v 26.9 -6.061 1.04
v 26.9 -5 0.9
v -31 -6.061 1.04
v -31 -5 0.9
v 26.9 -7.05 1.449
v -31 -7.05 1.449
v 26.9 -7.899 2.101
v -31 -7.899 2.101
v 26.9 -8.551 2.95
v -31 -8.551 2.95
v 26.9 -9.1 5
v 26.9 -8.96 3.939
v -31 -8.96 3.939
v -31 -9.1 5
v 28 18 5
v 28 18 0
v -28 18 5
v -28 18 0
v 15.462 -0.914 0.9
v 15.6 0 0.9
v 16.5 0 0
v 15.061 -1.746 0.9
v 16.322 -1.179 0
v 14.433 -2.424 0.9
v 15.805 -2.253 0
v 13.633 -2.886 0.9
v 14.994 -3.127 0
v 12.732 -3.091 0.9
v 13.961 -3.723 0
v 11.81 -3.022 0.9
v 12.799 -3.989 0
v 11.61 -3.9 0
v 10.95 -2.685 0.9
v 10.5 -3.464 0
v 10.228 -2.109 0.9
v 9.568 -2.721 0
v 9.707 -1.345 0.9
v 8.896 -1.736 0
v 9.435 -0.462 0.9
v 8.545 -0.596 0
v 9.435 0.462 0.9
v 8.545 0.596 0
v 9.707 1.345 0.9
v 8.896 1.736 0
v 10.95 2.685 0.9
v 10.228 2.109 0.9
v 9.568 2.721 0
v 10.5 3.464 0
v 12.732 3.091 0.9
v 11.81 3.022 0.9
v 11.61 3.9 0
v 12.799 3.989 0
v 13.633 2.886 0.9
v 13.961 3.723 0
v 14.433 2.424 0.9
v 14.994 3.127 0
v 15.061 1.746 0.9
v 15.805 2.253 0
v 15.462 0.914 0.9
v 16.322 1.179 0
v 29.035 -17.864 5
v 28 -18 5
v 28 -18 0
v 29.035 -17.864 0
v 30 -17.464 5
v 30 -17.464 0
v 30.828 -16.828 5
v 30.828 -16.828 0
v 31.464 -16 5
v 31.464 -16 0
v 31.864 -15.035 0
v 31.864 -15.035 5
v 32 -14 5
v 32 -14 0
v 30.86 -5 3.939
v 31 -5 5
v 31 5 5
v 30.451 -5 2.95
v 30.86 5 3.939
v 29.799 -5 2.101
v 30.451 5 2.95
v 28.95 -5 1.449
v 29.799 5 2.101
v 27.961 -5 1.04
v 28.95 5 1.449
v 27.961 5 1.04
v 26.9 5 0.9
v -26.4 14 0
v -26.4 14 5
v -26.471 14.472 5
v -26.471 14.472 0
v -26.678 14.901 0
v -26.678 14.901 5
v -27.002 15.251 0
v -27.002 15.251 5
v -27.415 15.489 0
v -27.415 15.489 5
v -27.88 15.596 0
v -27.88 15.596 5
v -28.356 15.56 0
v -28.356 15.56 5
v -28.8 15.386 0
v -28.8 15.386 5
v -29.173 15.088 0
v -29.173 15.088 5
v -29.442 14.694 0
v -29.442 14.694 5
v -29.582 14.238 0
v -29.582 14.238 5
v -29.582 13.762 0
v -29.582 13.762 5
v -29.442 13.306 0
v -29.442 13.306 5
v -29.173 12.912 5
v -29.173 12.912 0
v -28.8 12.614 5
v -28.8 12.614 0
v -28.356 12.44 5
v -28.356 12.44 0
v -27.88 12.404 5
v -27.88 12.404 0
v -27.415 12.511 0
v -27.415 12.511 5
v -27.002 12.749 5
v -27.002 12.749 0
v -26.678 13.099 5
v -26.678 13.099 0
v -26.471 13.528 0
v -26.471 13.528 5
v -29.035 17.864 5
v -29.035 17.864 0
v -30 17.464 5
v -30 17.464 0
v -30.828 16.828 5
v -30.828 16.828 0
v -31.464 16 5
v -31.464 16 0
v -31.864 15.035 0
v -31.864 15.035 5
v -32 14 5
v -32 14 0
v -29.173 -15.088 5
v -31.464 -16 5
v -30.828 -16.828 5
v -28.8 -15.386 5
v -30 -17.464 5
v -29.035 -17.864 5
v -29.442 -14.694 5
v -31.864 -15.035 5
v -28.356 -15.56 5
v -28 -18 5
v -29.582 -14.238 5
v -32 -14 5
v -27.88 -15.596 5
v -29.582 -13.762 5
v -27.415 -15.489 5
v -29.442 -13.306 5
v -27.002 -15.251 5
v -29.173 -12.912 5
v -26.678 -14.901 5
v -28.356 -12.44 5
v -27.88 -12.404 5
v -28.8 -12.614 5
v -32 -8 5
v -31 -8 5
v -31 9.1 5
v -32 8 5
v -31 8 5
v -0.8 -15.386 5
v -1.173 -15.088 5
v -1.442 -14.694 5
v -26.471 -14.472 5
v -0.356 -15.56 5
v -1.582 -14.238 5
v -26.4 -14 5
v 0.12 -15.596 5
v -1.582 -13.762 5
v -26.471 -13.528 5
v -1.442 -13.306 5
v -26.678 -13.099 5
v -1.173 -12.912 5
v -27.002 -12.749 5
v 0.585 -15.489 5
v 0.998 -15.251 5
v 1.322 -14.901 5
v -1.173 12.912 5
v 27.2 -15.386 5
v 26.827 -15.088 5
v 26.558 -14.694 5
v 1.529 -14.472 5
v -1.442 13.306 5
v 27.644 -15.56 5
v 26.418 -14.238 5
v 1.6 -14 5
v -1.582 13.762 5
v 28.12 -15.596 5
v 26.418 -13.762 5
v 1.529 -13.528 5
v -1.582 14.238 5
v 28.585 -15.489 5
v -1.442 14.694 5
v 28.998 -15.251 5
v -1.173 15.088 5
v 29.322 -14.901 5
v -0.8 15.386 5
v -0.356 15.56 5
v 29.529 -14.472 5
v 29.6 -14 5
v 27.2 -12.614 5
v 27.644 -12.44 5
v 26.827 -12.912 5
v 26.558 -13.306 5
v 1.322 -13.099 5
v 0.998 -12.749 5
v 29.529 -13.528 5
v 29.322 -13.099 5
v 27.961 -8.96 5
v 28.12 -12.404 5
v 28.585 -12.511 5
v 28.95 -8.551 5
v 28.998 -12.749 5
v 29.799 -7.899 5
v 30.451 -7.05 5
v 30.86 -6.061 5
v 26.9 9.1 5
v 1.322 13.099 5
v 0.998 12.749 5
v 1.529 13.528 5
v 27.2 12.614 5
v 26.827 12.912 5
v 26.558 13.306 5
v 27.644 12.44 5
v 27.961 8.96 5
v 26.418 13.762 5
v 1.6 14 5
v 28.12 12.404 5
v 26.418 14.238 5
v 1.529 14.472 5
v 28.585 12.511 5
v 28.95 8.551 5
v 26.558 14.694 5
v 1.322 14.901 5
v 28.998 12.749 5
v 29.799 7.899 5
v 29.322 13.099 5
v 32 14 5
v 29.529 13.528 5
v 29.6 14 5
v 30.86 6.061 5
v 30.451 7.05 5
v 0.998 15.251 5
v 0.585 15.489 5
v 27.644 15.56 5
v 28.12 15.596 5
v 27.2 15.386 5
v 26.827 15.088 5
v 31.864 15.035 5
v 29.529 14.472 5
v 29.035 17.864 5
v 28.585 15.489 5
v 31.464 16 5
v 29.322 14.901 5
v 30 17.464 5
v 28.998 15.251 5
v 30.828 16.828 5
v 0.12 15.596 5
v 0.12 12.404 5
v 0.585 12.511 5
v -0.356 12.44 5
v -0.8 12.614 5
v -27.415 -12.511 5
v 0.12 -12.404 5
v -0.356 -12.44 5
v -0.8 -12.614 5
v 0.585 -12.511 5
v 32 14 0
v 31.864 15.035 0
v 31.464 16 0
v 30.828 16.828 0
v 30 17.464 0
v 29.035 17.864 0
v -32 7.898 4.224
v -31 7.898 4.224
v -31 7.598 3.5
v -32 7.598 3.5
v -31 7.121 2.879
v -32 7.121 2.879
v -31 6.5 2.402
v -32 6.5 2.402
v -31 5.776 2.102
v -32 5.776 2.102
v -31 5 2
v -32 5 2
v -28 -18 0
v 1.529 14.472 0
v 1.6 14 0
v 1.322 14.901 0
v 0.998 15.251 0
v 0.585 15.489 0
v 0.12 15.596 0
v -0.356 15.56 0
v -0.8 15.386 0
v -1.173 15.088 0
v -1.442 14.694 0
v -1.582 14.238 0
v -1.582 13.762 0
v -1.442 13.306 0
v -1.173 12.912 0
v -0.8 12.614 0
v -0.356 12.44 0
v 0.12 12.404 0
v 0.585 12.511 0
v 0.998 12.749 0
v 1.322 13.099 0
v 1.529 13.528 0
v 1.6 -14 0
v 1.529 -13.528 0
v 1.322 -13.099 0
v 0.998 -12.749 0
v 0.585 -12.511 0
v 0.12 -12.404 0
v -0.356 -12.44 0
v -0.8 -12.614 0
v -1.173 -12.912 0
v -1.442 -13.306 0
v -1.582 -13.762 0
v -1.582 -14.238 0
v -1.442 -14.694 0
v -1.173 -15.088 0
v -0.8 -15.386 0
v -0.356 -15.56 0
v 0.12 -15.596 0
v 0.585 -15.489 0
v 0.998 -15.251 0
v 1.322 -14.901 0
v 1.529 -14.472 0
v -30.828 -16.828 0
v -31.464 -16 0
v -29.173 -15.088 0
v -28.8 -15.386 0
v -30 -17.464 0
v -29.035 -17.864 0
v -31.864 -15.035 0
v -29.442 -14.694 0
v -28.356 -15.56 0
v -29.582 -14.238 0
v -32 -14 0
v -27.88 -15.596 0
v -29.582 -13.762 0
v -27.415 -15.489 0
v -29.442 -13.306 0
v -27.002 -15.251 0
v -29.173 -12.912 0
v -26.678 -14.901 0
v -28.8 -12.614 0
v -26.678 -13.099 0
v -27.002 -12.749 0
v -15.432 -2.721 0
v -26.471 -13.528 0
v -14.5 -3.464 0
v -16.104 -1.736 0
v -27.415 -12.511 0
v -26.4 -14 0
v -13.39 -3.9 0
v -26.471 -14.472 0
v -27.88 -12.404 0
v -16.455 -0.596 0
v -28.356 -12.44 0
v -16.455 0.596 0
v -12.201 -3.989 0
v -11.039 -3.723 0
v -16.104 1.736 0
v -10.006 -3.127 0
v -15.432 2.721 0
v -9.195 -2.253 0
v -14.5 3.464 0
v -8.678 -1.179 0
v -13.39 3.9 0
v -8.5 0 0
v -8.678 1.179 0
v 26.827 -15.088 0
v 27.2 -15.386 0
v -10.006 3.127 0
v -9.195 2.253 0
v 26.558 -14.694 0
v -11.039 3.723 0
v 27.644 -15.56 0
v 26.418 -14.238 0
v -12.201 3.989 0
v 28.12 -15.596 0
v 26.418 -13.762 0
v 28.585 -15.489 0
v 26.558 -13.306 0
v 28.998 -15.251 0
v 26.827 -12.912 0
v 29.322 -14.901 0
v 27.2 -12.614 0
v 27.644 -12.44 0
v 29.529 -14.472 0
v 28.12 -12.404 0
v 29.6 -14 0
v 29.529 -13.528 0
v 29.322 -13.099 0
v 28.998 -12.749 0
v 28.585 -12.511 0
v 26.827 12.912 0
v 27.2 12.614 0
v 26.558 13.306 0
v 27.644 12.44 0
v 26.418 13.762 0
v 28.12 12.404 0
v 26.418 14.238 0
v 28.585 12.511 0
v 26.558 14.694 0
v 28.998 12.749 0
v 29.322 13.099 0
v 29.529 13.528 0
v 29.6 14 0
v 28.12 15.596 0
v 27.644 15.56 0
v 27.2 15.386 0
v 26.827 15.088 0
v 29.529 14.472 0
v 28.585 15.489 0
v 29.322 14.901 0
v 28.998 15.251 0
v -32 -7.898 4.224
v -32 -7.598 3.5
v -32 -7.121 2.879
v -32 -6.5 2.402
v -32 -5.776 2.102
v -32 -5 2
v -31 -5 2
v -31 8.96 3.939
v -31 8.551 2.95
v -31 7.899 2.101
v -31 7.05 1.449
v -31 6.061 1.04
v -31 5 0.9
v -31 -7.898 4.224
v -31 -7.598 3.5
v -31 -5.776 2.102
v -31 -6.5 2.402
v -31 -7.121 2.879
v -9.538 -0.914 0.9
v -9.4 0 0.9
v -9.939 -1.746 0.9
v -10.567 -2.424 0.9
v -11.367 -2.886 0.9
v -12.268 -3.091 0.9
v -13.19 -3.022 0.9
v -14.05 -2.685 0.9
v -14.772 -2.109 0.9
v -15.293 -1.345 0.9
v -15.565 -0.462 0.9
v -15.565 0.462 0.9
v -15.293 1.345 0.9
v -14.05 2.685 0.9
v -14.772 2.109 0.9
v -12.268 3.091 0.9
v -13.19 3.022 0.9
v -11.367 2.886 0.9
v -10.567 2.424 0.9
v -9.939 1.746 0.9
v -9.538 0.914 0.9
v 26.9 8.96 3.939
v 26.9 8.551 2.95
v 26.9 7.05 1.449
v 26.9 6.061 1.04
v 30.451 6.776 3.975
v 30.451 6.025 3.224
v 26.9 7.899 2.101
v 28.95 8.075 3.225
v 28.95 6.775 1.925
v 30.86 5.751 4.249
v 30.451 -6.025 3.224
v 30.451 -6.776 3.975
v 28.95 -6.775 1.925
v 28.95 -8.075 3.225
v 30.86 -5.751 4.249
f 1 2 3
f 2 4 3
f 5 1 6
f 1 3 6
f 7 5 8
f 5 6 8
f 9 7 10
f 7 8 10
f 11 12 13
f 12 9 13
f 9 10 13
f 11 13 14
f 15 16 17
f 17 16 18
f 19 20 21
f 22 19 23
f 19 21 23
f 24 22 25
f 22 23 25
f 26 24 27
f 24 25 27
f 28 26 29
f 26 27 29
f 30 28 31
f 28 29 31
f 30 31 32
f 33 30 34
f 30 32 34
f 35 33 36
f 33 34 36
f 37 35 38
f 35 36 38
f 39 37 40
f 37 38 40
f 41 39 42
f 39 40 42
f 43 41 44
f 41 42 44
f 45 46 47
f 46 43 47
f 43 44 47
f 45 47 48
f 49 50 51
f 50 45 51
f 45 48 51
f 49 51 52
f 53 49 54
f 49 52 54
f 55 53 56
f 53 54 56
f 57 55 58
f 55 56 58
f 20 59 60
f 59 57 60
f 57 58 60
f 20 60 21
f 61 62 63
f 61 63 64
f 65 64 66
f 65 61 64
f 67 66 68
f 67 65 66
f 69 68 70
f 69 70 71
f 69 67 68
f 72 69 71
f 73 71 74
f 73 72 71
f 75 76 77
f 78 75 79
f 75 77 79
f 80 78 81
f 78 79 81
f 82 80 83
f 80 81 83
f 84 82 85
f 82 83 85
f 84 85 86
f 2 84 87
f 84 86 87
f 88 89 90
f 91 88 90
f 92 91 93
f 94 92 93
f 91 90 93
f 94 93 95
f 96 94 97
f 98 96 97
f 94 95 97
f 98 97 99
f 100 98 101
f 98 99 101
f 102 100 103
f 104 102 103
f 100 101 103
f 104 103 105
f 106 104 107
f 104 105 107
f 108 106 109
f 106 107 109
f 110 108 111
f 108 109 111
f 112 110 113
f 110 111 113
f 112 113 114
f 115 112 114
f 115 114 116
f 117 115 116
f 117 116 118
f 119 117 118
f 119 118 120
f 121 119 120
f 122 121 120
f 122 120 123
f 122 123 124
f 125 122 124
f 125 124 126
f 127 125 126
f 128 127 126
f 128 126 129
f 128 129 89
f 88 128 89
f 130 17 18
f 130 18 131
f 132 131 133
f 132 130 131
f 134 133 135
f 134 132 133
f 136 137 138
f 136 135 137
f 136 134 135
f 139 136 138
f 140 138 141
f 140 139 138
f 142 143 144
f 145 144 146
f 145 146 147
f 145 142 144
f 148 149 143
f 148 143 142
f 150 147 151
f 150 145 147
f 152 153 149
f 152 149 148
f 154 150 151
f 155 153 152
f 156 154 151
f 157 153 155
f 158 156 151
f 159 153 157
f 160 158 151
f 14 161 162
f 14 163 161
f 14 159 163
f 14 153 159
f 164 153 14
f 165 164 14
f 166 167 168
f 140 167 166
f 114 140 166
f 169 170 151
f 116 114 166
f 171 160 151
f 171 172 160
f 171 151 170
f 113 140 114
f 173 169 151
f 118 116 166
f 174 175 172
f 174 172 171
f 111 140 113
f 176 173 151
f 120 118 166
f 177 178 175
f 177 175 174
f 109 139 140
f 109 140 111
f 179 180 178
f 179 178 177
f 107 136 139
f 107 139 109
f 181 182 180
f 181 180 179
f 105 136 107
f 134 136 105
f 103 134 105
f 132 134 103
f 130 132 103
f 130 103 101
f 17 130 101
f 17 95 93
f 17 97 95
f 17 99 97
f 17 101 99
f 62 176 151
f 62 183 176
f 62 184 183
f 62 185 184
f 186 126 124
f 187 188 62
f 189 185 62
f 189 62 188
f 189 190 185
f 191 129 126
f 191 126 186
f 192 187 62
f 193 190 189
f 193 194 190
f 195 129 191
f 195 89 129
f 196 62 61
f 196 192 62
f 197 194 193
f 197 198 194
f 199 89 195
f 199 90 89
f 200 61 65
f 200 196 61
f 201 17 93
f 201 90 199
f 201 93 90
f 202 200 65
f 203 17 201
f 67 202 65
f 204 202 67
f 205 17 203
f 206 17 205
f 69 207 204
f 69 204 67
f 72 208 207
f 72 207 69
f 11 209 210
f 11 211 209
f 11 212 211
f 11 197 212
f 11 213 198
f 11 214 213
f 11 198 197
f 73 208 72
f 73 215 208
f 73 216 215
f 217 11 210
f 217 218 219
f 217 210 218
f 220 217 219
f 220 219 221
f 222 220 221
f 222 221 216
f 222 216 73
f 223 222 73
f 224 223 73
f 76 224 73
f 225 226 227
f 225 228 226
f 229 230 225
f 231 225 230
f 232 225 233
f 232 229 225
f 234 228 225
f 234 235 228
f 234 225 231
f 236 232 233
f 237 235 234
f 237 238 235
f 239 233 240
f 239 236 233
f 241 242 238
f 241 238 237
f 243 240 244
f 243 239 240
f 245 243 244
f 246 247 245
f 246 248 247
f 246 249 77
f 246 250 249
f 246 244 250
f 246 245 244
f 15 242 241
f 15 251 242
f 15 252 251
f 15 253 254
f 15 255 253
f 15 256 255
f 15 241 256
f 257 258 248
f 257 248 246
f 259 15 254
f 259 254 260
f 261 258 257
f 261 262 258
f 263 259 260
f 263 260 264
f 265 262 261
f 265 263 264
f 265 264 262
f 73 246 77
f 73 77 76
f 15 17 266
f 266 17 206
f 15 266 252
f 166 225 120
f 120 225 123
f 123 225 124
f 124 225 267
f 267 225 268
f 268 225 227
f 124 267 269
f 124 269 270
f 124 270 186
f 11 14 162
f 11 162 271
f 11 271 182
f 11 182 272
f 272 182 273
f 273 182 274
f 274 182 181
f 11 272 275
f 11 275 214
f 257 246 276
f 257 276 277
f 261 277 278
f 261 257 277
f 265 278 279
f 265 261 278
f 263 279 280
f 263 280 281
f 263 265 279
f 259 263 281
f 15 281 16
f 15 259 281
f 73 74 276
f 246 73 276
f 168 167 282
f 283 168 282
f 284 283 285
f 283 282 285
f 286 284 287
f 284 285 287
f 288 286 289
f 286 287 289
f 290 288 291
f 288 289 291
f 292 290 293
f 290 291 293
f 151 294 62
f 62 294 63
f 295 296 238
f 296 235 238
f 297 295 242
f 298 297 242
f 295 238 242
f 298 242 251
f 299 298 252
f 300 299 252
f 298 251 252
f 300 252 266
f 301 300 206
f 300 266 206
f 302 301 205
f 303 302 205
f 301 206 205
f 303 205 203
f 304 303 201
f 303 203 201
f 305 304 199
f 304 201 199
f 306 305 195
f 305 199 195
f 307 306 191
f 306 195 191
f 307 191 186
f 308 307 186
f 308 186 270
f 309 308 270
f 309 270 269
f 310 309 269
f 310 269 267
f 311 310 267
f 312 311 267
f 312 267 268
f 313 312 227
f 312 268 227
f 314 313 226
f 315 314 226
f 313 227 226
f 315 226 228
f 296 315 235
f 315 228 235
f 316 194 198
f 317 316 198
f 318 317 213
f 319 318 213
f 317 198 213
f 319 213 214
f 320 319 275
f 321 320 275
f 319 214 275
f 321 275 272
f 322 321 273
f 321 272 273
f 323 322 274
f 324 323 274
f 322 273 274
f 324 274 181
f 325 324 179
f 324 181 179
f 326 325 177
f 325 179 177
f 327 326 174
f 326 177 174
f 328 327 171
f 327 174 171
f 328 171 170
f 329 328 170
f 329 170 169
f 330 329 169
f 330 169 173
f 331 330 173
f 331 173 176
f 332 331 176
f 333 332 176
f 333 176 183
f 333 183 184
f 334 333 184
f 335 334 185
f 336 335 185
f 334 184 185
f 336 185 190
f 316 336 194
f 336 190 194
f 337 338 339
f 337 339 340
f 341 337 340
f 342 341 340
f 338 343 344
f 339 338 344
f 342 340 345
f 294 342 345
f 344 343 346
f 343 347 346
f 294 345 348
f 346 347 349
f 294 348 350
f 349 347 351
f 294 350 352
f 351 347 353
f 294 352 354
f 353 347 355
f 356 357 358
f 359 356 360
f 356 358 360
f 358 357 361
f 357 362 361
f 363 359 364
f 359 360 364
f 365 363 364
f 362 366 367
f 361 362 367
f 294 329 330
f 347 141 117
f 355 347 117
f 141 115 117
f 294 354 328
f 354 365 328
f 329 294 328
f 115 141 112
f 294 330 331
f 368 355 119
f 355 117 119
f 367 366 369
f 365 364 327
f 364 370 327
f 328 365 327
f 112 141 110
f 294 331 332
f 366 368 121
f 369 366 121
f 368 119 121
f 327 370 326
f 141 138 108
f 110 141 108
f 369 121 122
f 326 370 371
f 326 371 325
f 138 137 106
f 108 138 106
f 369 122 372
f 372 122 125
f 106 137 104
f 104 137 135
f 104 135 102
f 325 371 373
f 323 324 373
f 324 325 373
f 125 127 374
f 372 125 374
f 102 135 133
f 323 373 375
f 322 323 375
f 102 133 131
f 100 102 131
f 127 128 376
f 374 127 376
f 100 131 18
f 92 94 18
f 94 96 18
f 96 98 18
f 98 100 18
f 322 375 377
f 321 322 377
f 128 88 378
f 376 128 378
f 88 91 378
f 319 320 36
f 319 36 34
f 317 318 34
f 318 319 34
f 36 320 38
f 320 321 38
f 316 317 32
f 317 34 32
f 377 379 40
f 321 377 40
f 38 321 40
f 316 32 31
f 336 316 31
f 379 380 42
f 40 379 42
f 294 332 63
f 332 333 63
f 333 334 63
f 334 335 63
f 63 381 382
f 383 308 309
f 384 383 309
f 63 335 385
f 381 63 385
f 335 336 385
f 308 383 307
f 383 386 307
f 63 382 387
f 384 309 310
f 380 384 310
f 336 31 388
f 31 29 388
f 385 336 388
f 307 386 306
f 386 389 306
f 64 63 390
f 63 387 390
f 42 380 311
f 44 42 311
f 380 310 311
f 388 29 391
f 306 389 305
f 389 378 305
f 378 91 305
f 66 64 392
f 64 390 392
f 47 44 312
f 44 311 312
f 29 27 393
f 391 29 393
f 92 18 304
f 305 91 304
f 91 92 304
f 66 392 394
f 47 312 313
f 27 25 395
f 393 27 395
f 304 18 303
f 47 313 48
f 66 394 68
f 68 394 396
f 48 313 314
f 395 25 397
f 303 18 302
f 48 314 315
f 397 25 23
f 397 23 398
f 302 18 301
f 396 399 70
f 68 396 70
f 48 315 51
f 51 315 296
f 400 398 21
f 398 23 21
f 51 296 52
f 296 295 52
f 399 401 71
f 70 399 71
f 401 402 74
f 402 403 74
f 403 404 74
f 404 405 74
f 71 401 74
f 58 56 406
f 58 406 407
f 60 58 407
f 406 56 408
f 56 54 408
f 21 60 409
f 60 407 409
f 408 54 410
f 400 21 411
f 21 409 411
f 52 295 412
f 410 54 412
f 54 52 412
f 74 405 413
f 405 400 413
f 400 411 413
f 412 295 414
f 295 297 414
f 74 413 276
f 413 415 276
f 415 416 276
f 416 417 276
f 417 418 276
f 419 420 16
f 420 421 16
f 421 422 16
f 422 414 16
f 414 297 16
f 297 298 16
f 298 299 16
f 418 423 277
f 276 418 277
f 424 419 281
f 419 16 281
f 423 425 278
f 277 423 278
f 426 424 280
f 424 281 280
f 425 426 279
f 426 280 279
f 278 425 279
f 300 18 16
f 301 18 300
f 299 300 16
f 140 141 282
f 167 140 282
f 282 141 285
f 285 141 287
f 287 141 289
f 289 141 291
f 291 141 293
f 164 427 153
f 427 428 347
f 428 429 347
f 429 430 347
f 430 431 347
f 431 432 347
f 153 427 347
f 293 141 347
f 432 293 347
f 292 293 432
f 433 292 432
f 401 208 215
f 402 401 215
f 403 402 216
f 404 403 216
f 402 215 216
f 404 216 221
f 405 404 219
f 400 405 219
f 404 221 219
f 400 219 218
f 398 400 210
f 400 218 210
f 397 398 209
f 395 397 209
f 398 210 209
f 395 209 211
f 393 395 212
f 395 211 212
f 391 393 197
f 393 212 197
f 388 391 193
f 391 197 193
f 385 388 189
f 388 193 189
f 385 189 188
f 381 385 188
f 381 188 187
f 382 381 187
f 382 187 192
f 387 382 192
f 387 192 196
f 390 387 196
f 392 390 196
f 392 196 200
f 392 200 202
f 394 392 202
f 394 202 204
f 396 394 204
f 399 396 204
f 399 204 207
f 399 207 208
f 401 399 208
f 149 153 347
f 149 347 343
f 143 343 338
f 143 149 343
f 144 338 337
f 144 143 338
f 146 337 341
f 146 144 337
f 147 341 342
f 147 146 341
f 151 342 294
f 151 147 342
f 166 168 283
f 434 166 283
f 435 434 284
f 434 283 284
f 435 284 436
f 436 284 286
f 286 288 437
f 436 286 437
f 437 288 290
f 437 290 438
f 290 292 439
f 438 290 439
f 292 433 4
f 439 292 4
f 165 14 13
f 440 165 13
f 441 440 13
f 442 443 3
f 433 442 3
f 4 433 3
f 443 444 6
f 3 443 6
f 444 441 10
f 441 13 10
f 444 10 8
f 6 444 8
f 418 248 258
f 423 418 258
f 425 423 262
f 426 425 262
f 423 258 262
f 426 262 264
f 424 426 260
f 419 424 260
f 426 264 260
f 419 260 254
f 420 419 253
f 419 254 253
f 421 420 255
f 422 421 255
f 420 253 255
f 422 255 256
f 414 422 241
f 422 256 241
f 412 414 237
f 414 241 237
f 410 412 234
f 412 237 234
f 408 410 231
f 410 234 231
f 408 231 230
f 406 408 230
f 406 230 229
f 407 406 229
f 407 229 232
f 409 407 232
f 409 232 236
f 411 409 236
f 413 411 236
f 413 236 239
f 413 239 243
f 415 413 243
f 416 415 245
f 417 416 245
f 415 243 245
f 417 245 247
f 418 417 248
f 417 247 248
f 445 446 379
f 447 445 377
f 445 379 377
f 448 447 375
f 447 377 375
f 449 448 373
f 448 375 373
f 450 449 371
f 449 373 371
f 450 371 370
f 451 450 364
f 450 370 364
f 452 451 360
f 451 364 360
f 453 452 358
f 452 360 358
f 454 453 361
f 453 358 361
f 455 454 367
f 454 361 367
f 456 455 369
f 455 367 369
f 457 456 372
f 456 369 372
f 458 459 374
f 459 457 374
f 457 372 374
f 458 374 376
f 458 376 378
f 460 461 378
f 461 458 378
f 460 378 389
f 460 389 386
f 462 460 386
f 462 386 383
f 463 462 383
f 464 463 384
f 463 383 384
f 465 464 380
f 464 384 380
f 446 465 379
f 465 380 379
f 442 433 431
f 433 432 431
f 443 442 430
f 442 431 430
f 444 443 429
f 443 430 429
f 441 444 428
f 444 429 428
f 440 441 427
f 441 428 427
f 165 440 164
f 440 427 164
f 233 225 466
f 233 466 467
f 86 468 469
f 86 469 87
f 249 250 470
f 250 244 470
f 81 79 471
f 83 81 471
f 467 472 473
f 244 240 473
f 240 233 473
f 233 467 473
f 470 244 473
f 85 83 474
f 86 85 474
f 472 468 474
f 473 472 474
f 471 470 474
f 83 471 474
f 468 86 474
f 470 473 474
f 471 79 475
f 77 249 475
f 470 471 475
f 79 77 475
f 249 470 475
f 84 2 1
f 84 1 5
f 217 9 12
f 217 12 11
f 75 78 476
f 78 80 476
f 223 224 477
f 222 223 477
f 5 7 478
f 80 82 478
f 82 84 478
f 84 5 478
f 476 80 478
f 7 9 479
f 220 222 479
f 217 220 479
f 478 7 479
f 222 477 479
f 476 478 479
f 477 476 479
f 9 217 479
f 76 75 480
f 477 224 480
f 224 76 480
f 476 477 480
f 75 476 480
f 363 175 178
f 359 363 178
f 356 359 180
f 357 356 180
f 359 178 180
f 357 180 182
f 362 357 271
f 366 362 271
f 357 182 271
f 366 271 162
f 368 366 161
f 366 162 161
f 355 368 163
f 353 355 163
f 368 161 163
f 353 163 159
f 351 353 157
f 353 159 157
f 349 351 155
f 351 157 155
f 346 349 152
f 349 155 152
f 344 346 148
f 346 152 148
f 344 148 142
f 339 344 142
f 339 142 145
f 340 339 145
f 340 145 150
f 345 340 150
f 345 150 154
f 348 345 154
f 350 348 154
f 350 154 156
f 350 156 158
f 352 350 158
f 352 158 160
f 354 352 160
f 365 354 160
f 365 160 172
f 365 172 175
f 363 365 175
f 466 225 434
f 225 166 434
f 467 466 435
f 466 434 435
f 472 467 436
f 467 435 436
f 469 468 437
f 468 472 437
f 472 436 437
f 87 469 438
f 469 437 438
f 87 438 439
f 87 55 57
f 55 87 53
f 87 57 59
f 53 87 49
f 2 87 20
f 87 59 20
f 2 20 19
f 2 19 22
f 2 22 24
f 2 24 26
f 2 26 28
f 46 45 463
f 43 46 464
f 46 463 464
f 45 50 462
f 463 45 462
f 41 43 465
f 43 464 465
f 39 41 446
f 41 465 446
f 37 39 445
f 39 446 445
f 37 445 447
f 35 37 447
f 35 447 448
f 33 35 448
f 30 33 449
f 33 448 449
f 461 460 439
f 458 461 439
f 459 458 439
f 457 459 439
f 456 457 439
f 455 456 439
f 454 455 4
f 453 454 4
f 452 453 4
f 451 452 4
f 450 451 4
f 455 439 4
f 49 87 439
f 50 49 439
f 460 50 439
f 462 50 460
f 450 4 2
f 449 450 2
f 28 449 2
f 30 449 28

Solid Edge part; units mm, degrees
sketch "Sketch1" plane through (0, 0, 0) normal (0, 0, 1) x (1, 0, 0)
  line L0 (32, -18) -> (32, 18)
  line L1 (32, 18) -> (-32, 18)
  line L2 (-32, 18) -> (-32, -18)
  line L3 (-32, -18) -> (32, -18)
extrude "Protrusion1" add sketch "Sketch1" along normal blind 5
sketch "Sketch2" plane through (-32, 0, 2.5) normal (-1, 0, 0) x (0, -1, 0)
  line L0 (-5, -0.5) -> (5, -0.5)
  line L1 (-8, 2.5) -> (8, 2.5)
  arc A0 (8, 2.5) -> (5, -0.5) centre (5, 2.5) cw
  arc A1 (-5, -0.5) -> (-8, 2.5) centre (-5, 2.5) cw
extrude "VaciadoExtruido_2" cut sketch "Sketch2" against normal blind 1
sketch "Sketch3" plane through (-31, 0, 2.5) normal (-1, 0, 0) x (0, -1, 0)
  line L0 (-5, -1.6) -> (5, -1.6)
  line L1 (-9.1, 2.5) -> (9.1, 2.5)
  arc A0 (9.1, 2.5) -> (5, -1.6) centre (5, 2.5) cw
  arc A1 (-5, -1.6) -> (-9.1, 2.5) centre (-5, 2.5) cw
extrude "VaciadoExtruido_3" cut sketch "Sketch3" against normal blind 62
fillet "Redondeo_3" radius 4.1 3 edges at (31, 7.8991, 2.1009) (31, -7.8991, 2.1009) (31, 0, 0.9)
sketch "Sketch4" plane through (0, 0, 5) normal (0, 0, 1) x (1, 0, 0)
  circle A0 centre (-28, 14) radius 1.6
extrude "Cutout1" cut sketch "Sketch4" against normal through all
pattern_linear "Pattern1" count 3 spacing 28 along (1, 0, 0) count 2 spacing 28 along (0, -1, 0) of "Cutout1"
fillet "Redondeo_4" radius 4 4 edges at (-32, 18, 2.5) (-32, -18, 2.5) (32, 18, 2.5) (32, -18, 2.5)
sketch "Sketch5" plane through (0, 0, 0) normal (0, 0, -1) x (1, 0, 0)
  circle A0 centre (12.5, 0) radius 3
  circle A1 centre (-12.5, 0) radius 3
  dimension "D1" = 25
  dimension "D2" = 12.5
extrude "Cutout2" cut sketch "Sketch5" against normal through all
chamfer "Chaflán_1" distance 1 angle 45 2 edges at (-15.5, 0, 0) (9.5, 0, 0)
